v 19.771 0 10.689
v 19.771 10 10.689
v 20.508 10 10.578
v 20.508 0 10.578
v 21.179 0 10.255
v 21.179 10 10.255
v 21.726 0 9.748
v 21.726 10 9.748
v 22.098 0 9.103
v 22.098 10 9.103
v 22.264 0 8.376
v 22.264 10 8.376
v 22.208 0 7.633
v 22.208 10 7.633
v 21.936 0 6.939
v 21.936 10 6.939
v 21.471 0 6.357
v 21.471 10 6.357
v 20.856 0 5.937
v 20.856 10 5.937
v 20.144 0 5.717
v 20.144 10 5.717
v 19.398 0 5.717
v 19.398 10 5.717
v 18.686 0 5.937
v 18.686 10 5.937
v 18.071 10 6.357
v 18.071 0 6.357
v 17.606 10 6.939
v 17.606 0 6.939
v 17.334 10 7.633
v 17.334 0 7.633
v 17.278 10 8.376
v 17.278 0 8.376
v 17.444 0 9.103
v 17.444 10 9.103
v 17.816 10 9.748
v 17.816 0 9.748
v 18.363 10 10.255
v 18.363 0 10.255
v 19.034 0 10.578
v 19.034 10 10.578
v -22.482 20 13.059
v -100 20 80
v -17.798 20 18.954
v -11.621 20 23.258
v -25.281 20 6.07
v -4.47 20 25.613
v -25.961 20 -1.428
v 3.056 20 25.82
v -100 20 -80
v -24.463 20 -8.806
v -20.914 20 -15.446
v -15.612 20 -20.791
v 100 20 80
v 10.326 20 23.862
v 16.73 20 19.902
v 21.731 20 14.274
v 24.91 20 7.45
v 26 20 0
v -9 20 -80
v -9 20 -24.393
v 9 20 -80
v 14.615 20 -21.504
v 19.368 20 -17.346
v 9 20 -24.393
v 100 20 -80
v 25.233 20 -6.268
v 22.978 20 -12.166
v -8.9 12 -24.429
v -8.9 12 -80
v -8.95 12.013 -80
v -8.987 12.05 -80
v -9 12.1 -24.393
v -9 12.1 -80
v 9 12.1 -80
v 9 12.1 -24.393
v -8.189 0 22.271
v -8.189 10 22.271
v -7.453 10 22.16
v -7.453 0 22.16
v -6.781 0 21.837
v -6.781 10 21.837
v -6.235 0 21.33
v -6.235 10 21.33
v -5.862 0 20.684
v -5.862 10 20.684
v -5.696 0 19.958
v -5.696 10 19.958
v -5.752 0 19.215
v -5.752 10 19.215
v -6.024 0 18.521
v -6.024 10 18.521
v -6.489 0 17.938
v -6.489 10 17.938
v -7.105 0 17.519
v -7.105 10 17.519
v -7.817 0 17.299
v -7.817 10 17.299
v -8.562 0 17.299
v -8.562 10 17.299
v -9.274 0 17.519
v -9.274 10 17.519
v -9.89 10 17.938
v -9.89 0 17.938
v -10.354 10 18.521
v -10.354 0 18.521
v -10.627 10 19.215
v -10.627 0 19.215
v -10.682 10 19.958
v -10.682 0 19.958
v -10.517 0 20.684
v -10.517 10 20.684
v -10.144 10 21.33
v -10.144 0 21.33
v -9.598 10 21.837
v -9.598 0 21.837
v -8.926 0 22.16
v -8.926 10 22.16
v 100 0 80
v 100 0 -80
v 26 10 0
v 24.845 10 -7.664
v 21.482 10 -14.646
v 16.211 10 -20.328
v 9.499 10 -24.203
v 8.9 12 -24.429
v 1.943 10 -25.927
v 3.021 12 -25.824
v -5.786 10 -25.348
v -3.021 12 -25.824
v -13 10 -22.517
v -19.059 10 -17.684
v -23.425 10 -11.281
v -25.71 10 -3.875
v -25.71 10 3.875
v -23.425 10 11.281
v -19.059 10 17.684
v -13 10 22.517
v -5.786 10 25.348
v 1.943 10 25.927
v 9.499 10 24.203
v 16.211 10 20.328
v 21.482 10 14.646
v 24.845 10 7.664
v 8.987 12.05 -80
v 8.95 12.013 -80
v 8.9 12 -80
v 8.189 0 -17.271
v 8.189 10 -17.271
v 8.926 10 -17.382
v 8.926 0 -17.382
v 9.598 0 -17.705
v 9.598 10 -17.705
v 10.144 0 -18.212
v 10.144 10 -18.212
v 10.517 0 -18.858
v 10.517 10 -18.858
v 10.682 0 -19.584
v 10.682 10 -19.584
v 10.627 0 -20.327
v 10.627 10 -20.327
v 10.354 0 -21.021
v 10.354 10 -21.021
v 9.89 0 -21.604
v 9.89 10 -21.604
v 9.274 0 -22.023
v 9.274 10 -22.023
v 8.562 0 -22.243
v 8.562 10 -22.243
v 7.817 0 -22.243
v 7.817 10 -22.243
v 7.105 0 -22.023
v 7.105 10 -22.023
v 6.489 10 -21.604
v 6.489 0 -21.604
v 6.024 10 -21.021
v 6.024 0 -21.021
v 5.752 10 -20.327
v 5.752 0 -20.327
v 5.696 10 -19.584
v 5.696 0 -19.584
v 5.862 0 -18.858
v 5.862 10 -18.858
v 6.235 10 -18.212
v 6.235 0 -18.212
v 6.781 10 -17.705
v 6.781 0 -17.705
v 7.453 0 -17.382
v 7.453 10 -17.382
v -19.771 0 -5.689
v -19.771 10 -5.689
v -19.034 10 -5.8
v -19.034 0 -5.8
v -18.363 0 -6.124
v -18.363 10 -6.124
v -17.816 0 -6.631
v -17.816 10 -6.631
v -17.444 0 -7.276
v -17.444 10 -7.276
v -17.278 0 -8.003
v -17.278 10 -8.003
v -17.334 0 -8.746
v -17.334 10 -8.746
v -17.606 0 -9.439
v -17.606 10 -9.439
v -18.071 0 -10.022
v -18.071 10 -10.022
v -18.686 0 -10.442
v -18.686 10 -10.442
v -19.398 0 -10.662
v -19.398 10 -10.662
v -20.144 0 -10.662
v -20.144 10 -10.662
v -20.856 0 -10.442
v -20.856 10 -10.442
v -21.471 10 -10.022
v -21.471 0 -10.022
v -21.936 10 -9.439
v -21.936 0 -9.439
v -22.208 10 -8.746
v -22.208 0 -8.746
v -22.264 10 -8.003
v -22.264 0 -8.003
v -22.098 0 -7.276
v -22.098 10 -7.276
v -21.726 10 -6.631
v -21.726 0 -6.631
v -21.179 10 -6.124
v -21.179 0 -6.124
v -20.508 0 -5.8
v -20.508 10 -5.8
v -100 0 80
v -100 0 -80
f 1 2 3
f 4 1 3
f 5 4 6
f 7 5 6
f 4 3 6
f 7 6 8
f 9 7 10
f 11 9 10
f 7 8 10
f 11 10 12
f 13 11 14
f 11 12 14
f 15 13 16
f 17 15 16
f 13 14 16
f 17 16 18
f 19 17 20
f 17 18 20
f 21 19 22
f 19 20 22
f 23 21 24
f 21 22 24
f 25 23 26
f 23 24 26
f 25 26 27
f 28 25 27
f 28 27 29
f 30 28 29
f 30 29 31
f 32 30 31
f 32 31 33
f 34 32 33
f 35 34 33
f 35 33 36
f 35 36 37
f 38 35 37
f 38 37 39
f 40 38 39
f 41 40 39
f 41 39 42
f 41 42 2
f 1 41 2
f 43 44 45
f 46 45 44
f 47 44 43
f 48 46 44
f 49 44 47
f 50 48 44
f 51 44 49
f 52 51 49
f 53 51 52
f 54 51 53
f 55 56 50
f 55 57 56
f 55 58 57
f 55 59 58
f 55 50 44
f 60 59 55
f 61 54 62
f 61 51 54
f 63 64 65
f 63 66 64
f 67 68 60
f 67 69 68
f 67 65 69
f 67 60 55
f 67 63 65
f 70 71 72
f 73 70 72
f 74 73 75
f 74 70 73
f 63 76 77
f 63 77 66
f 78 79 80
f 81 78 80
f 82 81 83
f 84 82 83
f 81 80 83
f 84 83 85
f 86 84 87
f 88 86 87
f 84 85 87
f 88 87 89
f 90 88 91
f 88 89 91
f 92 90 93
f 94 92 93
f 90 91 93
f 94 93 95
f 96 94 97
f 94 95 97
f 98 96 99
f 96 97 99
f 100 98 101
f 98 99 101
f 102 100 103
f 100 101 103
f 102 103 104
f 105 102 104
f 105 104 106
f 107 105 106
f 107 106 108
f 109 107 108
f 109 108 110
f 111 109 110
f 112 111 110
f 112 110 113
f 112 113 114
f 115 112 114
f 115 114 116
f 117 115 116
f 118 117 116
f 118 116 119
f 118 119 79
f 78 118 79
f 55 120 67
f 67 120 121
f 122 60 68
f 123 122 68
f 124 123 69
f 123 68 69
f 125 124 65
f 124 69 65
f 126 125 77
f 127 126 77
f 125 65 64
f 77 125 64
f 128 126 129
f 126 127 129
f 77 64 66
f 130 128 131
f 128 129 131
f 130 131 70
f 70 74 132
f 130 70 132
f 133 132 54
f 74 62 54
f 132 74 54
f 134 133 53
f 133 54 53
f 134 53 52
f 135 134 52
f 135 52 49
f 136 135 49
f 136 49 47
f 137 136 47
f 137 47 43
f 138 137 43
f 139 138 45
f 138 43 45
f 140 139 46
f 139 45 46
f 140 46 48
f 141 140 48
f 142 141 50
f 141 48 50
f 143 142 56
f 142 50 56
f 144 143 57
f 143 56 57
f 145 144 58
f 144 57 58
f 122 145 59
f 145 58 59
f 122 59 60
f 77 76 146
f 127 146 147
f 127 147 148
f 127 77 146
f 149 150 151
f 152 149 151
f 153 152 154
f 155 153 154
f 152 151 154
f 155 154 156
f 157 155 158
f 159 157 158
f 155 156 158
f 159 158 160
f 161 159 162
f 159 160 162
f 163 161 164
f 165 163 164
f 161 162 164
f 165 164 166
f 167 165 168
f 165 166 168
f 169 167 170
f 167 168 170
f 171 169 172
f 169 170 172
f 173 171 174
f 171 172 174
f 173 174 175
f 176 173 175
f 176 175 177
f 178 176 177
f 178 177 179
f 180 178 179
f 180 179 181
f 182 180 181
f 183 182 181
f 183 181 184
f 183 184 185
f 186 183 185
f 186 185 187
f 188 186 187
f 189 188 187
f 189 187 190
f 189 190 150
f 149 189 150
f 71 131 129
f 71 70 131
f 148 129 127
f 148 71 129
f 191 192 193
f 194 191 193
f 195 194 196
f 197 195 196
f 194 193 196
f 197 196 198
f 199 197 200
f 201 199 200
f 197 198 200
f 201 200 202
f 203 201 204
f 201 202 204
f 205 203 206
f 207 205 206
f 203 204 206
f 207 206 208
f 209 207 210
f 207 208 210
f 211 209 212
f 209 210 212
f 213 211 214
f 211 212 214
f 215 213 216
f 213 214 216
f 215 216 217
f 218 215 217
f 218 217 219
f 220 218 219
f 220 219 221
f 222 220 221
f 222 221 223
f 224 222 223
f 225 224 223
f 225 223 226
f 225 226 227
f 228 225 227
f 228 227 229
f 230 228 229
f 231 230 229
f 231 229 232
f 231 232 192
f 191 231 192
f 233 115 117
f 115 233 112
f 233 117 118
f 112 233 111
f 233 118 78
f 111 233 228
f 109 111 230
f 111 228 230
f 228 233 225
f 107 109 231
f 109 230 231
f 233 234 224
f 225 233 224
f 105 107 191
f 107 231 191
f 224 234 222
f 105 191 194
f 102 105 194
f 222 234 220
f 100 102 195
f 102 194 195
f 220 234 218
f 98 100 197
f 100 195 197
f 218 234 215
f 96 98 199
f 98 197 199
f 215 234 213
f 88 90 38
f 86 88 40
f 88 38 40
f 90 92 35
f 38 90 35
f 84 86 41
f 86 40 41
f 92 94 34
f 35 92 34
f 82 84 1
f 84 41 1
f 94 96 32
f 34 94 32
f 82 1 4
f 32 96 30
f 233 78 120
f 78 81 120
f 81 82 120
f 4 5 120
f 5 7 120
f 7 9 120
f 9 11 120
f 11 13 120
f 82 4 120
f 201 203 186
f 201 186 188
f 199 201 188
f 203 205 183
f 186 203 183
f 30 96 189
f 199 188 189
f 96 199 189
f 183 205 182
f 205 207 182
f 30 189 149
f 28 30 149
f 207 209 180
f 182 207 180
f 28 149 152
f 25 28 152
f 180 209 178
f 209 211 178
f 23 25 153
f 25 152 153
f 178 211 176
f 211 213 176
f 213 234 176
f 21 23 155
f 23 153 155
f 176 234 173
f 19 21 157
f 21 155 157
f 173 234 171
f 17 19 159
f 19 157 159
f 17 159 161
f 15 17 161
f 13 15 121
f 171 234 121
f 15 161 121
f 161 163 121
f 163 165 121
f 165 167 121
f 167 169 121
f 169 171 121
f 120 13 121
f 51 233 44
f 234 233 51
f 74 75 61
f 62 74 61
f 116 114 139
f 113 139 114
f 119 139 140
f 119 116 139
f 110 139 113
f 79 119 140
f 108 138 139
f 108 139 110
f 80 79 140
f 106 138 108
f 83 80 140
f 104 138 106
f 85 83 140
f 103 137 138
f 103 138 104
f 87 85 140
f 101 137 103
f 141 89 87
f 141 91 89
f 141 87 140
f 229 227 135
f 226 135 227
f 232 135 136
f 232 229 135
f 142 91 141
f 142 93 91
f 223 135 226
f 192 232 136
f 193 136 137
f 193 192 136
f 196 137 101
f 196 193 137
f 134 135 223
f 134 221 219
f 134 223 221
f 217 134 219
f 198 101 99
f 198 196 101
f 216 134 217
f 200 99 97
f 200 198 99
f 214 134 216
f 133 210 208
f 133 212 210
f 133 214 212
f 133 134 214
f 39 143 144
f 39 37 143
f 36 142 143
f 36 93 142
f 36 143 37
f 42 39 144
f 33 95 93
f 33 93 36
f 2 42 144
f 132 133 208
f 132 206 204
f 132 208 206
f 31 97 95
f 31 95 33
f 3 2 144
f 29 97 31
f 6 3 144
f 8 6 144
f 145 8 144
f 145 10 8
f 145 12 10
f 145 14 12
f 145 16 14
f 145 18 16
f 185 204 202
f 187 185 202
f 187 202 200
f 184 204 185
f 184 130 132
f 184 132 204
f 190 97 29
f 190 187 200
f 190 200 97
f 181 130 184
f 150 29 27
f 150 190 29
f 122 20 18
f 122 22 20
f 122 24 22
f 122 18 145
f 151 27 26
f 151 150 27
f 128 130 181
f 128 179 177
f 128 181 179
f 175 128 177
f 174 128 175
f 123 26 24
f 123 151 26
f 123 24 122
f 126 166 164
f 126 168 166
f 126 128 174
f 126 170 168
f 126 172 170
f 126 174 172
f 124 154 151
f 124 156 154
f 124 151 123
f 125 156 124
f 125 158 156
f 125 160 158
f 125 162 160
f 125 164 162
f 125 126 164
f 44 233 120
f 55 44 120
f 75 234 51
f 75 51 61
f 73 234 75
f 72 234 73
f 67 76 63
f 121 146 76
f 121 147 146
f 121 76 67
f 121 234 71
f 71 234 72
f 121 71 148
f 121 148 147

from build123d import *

# Parameters (mm, degrees)
SKETCH1_W                 = 200
SKETCH1_H                 = 160
BASE_DEPTH                = 20
SKETCH2_R                 = 26
LOAD_CELL_CUT_DEPTH       = 10
CUT_WIRE_REACH            = 162
SKETCH6_W                 = 18
SKETCH6_H                 = 8
FILLET6_R                 = 0.1
F_5_0MM_DOWEL_HOLE1_D     = 5
F_5_0MM_DOWEL_HOLE1_DEPTH = 10


with BuildPart() as part:
    # Sketch1 → base (new body)
    with BuildSketch(Plane(origin=(0, 0, 0), x_dir=(1, 0, 0), z_dir=(0, 1, 0))):
        Rectangle(SKETCH1_W, SKETCH1_H)
    extrude(amount=BASE_DEPTH)

    # Sketch2 → load cell cut (cut)
    with BuildSketch(Plane(origin=(0, 20, 0), x_dir=(1, 0, 0), z_dir=(0, 1, 0))):
        Circle(SKETCH2_R)
    extrude(amount=-LOAD_CELL_CUT_DEPTH, mode=Mode.SUBTRACT)

    # Sketch6 → cut wire (cut, up to next)
    with BuildSketch(Plane.XY.offset(-80), mode=Mode.PRIVATE) as cut_wire_sk1:
        with Locations((0, 16)):
            Rectangle(SKETCH6_W, SKETCH6_H)
    cut_wire_tool1 = extrude(cut_wire_sk1.sketch, amount=CUT_WIRE_REACH, mode=Mode.PRIVATE) & part.part
    add(cut_wire_tool1.solids().sort_by_distance((0, 16, -80))[0], mode=Mode.SUBTRACT)

    # Fillet6
    fillet6_edges = [part.edges().sort_by_distance(p)[0] for p in [
        (9, 12, -52.196310918),
        (-9, 12, -52.196310918),
    ]]
    fillet(fillet6_edges, radius=FILLET6_R)

    # Ø5.0mm Dowel Hole1
    with Locations(Plane(origin=(-8.189425453, 0, 19.771021996), x_dir=(0, 0, -1), z_dir=(0, -1, 0))):
        with Locations((0, 0), (11.581596543, 27.960447449), (39.542043992, 16.378850906), (27.960447449, -11.581596543)):
            Hole(F_5_0MM_DOWEL_HOLE1_D / 2, depth=F_5_0MM_DOWEL_HOLE1_DEPTH)


solid = part.part
